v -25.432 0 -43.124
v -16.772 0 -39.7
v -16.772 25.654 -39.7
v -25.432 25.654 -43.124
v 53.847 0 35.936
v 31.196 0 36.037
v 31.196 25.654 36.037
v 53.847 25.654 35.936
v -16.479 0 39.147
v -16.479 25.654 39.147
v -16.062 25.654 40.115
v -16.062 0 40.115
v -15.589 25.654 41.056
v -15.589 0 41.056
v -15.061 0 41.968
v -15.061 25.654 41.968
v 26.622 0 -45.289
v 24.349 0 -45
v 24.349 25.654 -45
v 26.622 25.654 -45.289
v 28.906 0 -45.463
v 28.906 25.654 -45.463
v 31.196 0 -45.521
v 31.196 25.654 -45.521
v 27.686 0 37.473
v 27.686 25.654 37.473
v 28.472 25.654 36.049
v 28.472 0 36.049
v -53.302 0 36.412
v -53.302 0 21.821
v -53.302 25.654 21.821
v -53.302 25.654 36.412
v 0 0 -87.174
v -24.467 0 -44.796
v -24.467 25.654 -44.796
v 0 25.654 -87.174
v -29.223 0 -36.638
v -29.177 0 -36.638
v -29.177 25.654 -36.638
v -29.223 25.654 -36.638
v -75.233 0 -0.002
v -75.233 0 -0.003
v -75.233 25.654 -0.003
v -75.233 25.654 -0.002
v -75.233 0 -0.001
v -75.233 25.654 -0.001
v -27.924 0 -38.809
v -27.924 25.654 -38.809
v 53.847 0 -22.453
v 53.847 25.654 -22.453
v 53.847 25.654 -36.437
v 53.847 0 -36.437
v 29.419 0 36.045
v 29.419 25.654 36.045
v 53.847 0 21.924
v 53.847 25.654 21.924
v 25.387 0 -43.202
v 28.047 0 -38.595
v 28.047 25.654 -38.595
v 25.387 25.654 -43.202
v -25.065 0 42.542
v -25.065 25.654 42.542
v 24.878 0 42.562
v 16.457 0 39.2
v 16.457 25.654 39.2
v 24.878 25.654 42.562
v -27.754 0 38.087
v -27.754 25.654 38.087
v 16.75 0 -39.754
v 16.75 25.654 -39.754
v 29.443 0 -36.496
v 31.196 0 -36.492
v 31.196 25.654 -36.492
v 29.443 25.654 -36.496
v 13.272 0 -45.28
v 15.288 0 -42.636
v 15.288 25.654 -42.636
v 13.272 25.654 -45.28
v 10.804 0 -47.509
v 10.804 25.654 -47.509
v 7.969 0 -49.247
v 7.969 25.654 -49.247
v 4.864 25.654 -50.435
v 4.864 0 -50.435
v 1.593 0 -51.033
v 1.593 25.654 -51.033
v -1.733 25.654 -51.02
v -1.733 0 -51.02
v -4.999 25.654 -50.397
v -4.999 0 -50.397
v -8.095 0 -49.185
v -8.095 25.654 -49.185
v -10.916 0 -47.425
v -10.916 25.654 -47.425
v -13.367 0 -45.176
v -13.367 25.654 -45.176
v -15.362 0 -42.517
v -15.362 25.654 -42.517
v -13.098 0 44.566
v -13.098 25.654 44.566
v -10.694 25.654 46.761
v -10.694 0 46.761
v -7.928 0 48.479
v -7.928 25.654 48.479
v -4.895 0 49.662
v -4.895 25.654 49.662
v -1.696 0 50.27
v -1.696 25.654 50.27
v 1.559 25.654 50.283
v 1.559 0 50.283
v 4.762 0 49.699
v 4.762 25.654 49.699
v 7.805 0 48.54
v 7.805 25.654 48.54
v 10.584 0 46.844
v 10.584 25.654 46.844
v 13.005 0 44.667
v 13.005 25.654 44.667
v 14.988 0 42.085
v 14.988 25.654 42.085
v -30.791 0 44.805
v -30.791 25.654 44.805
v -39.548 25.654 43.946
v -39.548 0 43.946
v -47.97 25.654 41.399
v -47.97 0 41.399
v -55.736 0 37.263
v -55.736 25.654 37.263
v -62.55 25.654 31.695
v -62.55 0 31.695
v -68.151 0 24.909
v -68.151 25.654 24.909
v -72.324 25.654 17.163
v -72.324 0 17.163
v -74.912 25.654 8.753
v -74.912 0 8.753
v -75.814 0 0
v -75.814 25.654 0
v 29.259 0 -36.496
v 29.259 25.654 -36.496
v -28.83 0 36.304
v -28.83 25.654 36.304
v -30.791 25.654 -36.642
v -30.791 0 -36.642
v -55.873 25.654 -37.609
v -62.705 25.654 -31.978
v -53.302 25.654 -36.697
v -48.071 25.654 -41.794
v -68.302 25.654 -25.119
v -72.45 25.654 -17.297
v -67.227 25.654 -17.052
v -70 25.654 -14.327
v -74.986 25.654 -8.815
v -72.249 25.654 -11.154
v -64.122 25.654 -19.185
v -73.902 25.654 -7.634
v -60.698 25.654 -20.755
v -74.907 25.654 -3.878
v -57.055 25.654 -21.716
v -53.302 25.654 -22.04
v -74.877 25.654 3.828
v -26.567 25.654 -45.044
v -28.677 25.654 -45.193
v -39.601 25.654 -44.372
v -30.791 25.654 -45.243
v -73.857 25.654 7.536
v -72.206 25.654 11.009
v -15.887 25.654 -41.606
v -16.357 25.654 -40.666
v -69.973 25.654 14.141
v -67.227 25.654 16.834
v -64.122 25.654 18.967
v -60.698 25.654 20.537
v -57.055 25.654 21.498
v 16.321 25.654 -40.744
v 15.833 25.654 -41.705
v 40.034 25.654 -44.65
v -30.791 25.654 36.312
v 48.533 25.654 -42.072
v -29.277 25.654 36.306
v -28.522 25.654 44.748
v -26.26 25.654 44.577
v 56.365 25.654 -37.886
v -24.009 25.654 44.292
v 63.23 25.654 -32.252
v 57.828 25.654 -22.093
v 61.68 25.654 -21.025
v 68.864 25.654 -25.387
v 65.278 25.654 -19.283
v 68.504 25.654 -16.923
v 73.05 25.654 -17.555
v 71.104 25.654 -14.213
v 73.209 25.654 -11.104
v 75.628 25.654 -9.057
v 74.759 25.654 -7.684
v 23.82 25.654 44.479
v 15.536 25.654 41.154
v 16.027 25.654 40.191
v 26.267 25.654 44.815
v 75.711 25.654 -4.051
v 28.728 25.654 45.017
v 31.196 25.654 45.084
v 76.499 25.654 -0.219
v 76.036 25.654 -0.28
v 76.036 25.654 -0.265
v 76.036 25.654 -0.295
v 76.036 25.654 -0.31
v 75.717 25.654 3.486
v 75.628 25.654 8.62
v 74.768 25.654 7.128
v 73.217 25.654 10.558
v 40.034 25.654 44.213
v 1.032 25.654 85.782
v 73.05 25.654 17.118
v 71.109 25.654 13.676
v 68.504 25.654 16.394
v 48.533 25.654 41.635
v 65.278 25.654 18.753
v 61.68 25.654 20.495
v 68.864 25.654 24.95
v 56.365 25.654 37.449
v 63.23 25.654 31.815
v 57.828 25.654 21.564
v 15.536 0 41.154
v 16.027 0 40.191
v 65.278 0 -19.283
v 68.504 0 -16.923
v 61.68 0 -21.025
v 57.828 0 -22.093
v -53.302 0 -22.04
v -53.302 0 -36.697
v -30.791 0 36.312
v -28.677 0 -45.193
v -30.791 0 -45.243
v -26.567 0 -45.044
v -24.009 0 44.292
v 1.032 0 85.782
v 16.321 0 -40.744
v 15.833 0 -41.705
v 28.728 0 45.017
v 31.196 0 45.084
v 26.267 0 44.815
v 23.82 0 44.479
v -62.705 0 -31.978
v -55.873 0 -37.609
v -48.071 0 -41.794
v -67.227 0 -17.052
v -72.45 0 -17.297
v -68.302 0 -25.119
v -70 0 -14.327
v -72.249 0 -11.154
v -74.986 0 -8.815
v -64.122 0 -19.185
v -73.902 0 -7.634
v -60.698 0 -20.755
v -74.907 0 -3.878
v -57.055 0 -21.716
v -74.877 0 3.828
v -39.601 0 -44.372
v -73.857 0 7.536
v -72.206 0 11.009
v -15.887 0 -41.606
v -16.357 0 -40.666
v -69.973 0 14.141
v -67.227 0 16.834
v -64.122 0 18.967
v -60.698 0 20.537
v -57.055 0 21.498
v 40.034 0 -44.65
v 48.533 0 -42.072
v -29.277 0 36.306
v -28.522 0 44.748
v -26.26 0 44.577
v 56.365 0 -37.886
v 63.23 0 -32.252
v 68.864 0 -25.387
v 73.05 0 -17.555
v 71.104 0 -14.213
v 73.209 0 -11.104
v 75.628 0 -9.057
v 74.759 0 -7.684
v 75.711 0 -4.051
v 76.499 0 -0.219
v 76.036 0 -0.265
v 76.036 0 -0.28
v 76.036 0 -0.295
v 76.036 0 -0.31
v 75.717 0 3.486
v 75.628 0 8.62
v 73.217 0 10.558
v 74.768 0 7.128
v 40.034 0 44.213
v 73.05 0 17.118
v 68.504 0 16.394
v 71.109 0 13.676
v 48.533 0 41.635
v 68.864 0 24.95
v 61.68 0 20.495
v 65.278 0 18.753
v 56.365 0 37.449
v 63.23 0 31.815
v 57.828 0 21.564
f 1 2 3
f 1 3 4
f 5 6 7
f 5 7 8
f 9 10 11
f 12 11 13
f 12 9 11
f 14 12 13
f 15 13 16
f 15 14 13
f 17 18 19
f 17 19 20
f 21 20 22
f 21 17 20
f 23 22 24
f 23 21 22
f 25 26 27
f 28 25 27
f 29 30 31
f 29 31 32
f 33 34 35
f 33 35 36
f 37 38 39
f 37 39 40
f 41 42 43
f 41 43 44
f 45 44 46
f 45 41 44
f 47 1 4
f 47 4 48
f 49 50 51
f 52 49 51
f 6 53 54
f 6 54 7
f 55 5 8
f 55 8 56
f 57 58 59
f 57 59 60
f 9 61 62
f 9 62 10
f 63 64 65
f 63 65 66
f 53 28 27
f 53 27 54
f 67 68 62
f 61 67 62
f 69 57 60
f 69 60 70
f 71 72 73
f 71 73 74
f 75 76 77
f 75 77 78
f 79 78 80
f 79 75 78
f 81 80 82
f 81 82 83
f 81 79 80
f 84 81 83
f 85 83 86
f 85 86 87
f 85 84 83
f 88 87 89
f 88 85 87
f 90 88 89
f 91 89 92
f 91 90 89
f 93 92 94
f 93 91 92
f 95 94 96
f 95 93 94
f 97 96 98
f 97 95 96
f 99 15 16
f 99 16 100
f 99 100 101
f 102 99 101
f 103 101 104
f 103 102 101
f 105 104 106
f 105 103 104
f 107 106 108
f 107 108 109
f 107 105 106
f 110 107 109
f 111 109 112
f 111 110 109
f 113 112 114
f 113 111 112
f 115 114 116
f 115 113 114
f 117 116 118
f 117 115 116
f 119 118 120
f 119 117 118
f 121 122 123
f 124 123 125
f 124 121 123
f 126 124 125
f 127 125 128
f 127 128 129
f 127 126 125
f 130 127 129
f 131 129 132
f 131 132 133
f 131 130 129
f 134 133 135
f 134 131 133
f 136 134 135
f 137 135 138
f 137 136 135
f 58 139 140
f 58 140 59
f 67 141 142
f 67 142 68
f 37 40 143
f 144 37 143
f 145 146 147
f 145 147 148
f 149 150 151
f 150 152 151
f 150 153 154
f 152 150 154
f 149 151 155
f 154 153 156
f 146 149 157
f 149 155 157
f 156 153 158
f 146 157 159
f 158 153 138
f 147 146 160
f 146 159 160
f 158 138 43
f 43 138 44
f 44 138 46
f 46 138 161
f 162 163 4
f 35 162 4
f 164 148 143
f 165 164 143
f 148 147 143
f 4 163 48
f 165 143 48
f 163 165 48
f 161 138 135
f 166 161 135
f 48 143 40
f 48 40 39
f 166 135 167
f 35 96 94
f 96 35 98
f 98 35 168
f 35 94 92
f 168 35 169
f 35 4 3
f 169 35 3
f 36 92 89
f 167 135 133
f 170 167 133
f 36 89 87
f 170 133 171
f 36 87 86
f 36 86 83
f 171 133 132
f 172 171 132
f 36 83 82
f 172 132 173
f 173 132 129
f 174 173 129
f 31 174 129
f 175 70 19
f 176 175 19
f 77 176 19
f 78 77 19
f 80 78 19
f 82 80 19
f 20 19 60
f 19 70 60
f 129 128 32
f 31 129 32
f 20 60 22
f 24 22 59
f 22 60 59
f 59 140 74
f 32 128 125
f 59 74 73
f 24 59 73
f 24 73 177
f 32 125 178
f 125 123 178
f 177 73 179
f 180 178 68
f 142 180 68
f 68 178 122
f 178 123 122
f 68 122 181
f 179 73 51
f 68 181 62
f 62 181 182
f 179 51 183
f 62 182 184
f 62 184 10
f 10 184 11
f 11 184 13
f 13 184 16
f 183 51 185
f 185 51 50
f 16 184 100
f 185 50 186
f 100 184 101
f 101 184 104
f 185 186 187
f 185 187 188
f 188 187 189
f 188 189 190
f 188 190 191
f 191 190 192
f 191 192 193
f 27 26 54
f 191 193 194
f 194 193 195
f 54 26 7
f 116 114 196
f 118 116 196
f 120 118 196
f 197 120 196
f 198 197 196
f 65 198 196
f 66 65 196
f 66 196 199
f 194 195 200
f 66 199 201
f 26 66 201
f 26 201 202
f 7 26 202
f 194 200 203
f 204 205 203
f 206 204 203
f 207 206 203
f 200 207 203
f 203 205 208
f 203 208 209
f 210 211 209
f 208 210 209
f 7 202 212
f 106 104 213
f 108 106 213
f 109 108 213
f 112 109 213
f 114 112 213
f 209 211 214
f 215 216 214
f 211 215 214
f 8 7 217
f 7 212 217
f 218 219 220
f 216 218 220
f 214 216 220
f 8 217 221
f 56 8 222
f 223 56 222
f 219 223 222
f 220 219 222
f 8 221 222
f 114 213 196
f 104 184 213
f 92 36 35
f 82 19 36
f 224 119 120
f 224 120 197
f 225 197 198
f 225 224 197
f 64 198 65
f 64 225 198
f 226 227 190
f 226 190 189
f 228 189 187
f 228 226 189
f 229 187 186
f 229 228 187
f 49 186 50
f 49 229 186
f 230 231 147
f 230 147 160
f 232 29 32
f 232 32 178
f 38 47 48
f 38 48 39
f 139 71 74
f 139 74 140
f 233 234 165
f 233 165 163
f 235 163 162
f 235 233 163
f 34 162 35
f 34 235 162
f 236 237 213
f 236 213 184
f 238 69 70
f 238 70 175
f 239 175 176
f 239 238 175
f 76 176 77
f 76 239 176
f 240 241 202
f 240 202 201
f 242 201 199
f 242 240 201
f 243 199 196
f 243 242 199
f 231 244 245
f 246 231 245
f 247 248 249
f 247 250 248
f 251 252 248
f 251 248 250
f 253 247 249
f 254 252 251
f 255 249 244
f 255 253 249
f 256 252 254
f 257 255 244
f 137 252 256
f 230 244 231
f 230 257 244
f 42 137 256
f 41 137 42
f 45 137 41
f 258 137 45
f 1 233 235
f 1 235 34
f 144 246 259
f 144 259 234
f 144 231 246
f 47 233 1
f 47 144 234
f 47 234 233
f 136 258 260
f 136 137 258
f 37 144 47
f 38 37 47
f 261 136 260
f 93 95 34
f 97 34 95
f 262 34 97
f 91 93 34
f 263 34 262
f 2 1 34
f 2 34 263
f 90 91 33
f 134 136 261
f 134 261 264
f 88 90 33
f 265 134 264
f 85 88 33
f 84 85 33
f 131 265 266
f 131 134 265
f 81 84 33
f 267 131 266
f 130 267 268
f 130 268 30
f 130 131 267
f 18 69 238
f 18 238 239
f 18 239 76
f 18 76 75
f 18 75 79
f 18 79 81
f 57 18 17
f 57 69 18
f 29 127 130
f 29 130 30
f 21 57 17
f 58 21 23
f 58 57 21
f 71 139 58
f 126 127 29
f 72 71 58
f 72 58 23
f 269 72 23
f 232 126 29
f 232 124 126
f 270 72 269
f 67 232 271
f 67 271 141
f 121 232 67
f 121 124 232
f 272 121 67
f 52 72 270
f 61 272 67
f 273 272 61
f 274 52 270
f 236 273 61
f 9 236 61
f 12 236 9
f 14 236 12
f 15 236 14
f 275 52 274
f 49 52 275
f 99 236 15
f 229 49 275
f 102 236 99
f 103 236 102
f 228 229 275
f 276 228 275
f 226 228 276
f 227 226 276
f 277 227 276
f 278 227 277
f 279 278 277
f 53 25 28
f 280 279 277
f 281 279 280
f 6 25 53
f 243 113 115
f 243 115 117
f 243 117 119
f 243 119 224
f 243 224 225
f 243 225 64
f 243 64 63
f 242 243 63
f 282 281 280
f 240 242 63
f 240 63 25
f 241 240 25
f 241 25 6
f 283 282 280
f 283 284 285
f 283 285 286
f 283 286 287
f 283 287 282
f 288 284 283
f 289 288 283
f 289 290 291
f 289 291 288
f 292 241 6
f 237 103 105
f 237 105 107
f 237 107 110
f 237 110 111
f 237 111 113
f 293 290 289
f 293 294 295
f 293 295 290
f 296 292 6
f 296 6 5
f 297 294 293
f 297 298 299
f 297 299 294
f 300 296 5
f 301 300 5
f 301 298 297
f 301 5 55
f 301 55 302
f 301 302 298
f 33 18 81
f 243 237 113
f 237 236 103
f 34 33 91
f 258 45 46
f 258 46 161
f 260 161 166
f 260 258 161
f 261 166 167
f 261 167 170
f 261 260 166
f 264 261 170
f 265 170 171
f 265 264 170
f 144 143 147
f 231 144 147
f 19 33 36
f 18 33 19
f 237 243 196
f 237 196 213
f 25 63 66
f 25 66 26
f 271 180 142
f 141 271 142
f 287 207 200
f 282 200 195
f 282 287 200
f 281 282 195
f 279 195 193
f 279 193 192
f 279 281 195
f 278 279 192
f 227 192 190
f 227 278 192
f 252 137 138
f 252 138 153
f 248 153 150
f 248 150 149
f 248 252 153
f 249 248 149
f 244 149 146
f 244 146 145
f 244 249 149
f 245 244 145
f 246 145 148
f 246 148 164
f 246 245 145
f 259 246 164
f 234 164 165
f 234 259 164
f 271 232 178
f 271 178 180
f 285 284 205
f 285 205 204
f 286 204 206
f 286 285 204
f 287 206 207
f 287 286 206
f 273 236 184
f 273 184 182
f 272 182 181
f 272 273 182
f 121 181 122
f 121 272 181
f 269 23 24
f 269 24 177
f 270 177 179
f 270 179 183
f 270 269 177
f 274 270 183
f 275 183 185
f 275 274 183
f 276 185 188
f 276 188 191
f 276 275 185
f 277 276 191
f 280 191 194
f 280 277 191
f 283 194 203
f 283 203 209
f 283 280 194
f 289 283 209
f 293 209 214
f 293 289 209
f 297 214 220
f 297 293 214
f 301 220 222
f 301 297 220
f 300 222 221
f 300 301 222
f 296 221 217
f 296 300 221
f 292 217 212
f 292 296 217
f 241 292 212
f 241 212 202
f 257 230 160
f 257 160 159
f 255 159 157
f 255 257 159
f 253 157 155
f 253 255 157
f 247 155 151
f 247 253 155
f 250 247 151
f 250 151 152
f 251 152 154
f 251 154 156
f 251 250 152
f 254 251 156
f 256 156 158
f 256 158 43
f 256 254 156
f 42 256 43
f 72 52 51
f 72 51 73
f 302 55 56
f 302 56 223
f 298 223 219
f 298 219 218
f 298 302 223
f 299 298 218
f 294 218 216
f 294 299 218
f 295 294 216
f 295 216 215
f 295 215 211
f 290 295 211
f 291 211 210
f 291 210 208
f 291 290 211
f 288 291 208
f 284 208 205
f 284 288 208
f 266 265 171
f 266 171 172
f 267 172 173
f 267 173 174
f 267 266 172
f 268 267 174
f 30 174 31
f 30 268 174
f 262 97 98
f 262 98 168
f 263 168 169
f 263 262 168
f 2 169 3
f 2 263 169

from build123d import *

# Parameters (mm, degrees)
F1_DEPTH = 25.4
F2_DEPTH = 25.654


with BuildPart() as f1:
    # F0 (on Front) → F1 (new body)
    with BuildSketch(Plane.XZ):
        with BuildLine():
            ThreePointArc((-15.060614174, 41.9682624685), (-0.0688082783, 50.3511332937), (14.987647146, 42.0849420703))
            ThreePointArc((14.987647146, 42.0849420703), (19.3434405932, 43.5057594661), (23.8204686342, 44.4793500101))
            Line((23.8204686342, 44.4793500101), (1.0321482392, 85.7816260454))
            Line((1.0321482392, 85.7816260454), (-24.0085215463, 44.2917114126))
            ThreePointArc((-24.0085215463, 44.2917114126), (-19.4747765312, 43.3602512097), (-15.060614174, 41.9682624685))
        make_face()
    extrude(amount=-F1_DEPTH)

    # F0 (on Front) → F2 (join)
    with BuildSketch(Plane.XZ):
        with BuildLine():
            Line((-28.8295803882, 36.30369346), (-27.7535005612, 38.0866513657))
            Line((-27.7535005612, 38.0866513657), (-30.7906209519, 44.8054462665))
            ThreePointArc((-30.7906209519, 44.8054462665), (-29.6489661187, 40.624103652), (-29.2771657497, 36.3056819144))
            Line((-29.2771657497, 36.3056819144), (-28.8295803882, 36.30369346))
        make_face()
        Polygon((-30.7906209519, 44.8054462665), (-27.7535005612, 38.0866513657), (-25.0648295944, 42.54151339), align=None)
        with BuildLine():
            Line((-53.3023555948, 36.4124168488), (-30.7906209519, 36.3124056299))
            Line((-30.7906209519, 36.3124056299), (-30.7906209519, 44.8054462665))
            ThreePointArc((-30.7906209519, 44.8054462665), (-62.5500321621, 31.6953988364), (-75.8140902377, 0))
            Line((-75.8140902377, 0), (-75.2328084137, -0.0011871857))
            ThreePointArc((-75.2328084137, -0.0011871857), (-73.1076200485, 9.3092127471), (-67.2269157832, 16.8336588954))
            ThreePointArc((-67.2269157832, 16.8336588954), (-60.6978163865, 20.5368755433), (-53.3023555948, 21.8214424558))
            Line((-53.3023555948, 21.8214424558), (-53.3023555948, 36.4124168488))
        make_face()
        with BuildLine():
            Line((-30.7906209519, 44.8054462665), (-30.7906209519, 36.3124056299))
            Line((-30.7906209519, 36.3124056299), (-29.2771657497, 36.3056819144))
            ThreePointArc((-29.2771657497, 36.3056819144), (-29.6489661187, 40.624103652), (-30.7906209519, 44.8054462665))
        make_face()
        with BuildLine():
            Line((-25.0648295944, 42.54151339), (-16.4788366985, 39.1466793172))
            ThreePointArc((-16.4788366985, 39.1466793172), (-15.832705808, 40.5891269445), (-15.060614174, 41.9682624685))
            ThreePointArc((-15.060614174, 41.9682624685), (-19.4747765312, 43.3602512097), (-24.0085215463, 44.2917114126))
            Line((-24.0085215463, 44.2917114126), (-25.0648295944, 42.54151339))
        make_face()
        with BuildLine():
            ThreePointArc((23.8204686342, 44.4793500101), (19.3434405932, 43.5057594661), (14.987647146, 42.0849420703))
            ThreePointArc((14.987647146, 42.0849420703), (15.7885662341, 40.6763432088), (16.4574657961, 39.2004721052))
            Line((16.4574657961, 39.2004721052), (24.8784135948, 42.5618969449))
            Line((24.8784135948, 42.5618969449), (23.8204686342, 44.4793500101))
        make_face()
        with BuildLine():
            ThreePointArc((-15.060614174, 41.9682624685), (-0.0688082783, 50.3511332937), (14.987647146, 42.0849420703))
            ThreePointArc((14.987647146, 42.0849420703), (19.3434405932, 43.5057594661), (23.8204686342, 44.4793500101))
            Line((23.8204686342, 44.4793500101), (1.0321482392, 85.7816260454))
            Line((1.0321482392, 85.7816260454), (-24.0085215463, 44.2917114126))
            ThreePointArc((-24.0085215463, 44.2917114126), (-19.4747765312, 43.3602512097), (-15.060614174, 41.9682624685))
        make_face()
        with BuildLine():
            ThreePointArc((-24.0085215463, 44.2917114126), (-27.3898564846, 44.6768288461), (-30.7906209519, 44.8054462665))
            Line((-30.7906209519, 44.8054462665), (-25.0648295944, 42.54151339))
            Line((-25.0648295944, 42.54151339), (-24.0085215463, 44.2917114126))
        make_face()
        with BuildLine():
            Line((29.4191831059, 36.0449159855), (31.1962604648, 36.0370210954))
            Line((31.1962604648, 36.0370210954), (31.1962604648, 45.083818219))
            ThreePointArc((31.1962604648, 45.083818219), (29.8777965479, 40.6488917918), (29.4191831059, 36.0449159855))
        make_face()
        with BuildLine():
            Line((31.1962604648, 45.083818219), (31.1962604648, 36.0370210954))
            Line((31.1962604648, 36.0370210954), (53.8473990671, 35.9363905568))
            Line((53.8473990671, 35.9363905568), (53.8473990671, 21.9238056105))
            ThreePointArc((53.8473990671, 21.9238056105), (61.6802350926, 20.4952804957), (68.5044998261, 16.3936448398))
            ThreePointArc((68.5044998261, 16.3936448398), (74.0656549864, 8.8761377727), (76.0360198852, -0.2648152075))
            ThreePointArc((76.0360198852, -0.2648152075), (76.036008316, -0.2874737281), (76.0359736084, -0.310132225))
            Line((76.0359736084, -0.310132225), (76.4985376694, -0.3110769465))
            ThreePointArc((76.4985376694, -0.3110769465), (63.2625699929, 31.7823320468), (31.1962604648, 45.083818219))
        make_face()
        Polygon((24.8784135948, 42.5618969449), (27.686077002, 37.4731985658), (31.1962604648, 45.083818219), align=None)
        with BuildLine():
            Line((31.1962604648, 45.083818219), (27.686077002, 37.4731985658))
            Line((27.686077002, 37.4731985658), (28.4718024235, 36.0491248436))
            Line((28.4718024235, 36.0491248436), (29.4191831059, 36.0449159855))
            ThreePointArc((29.4191831059, 36.0449159855), (29.8777965479, 40.6488917918), (31.1962604648, 45.083818219))
        make_face()
        Polygon((-25.4324655009, -43.1239806736), (-27.9238592306, -38.808760152), (-30.7906209519, -45.2425532036), align=None)
        with BuildLine():
            Line((-30.7906209519, -45.2425532036), (-27.9238592306, -38.808760152))
            Line((-27.9238592306, -38.808760152), (-29.1769886883, -36.6382762629))
            Line((-29.1769886883, -36.6382762629), (-29.2232528573, -36.6383886578))
            ThreePointArc((-29.2232528573, -36.6383886578), (-29.6130237377, -41.012227686), (-30.7906209519, -45.2425532036))
        make_face()
        with BuildLine():
            ThreePointArc((31.1962604648, 45.083818219), (27.4960007799, 44.9324482787), (23.8204686342, 44.4793500101))
            Line((23.8204686342, 44.4793500101), (24.8784135948, 42.5618969449))
            Line((24.8784135948, 42.5618969449), (31.1962604648, 45.083818219))
        make_face()
        with BuildLine():
            Line((-75.2328164085, -0.0028216264), (-75.8140902377, 0))
            ThreePointArc((-75.8140902377, 0), (-62.704573257, -31.9779646787), (-30.7906209519, -45.2425532036))
            Line((-30.7906209519, -45.2425532036), (-30.7906209519, -36.6421964468))
            Line((-30.7906209519, -36.6421964468), (-53.3023555948, -36.6968868137))
            Line((-53.3023555948, -36.6968868137), (-53.3023555948, -22.0399959243))
            ThreePointArc((-53.3023555948, -22.0399959243), (-60.6978163865, -20.7554290119), (-67.2269157832, -17.052212364))
            ThreePointArc((-67.2269157832, -17.052212364), (-73.1534528918, -9.4307777023), (-75.2328164085, -0.0028216264))
        make_face()
        with BuildLine():
            Line((-75.2328084137, -0.0011871857), (-75.8140902377, 0))
            Line((-75.8140902377, 0), (-75.2328164085, -0.0028216264))
            ThreePointArc((-75.2328164085, -0.0028216264), (-75.2328124264, -0.002004406), (-75.2328084137, -0.0011871857))
        make_face()
        with BuildLine():
            Line((-25.4324655009, -43.1239806736), (-30.7906209519, -45.2425532036))
            ThreePointArc((-30.7906209519, -45.2425532036), (-27.6209328908, -45.1308416505), (-24.4669738087, -44.7962613387))
            Line((-24.4669738087, -44.7962613387), (-25.4324655009, -43.1239806736))
        make_face()
        with BuildLine():
            Line((-30.7906209519, -36.6421964468), (-30.7906209519, -45.2425532036))
            ThreePointArc((-30.7906209519, -45.2425532036), (-29.6130237377, -41.012227686), (-29.2232528573, -36.6383886578))
            Line((-29.2232528573, -36.6383886578), (-30.7906209519, -36.6421964468))
        make_face()
        with BuildLine():
            Line((-16.7719402399, -39.6996770897), (-25.4324655009, -43.1239806736))
            Line((-25.4324655009, -43.1239806736), (-24.4669738087, -44.7962613387))
            ThreePointArc((-24.4669738087, -44.7962613387), (-19.855090202, -43.8943444673), (-15.3623330745, -42.5166442684))
            ThreePointArc((-15.3623330745, -42.5166442684), (-16.1287540245, -41.1389939394), (-16.7719402399, -39.6996770897))
        make_face()
        with BuildLine():
            ThreePointArc((24.3490687404, -45.0004789074), (19.7574141393, -44.0529882803), (15.2882742932, -42.6360128042))
            ThreePointArc((15.2882742932, -42.6360128042), (-0.070238078, -51.1034201303), (-15.3623330745, -42.5166442684))
            ThreePointArc((-15.3623330745, -42.5166442684), (-19.855090202, -43.8943444673), (-24.4669738087, -44.7962613387))
            Line((-24.4669738087, -44.7962613387), (0, -87.1743030828))
            Line((0, -87.1743030828), (24.3490687404, -45.0004789074))
        make_face()
        with BuildLine():
            ThreePointArc((16.7501892204, -39.754426672), (16.0838947627, -41.2280252172), (15.2882742932, -42.6360128042))
            ThreePointArc((15.2882742932, -42.6360128042), (19.7574141393, -44.0529882803), (24.3490687404, -45.0004789074))
            Line((24.3490687404, -45.0004789074), (25.387333514, -43.2021515679))
            Line((25.387333514, -43.2021515679), (16.7501892204, -39.754426672))
        make_face()
        with BuildLine():
            Line((29.2589523384, -36.4963110564), (28.047162827, -38.5951920583))
            Line((28.047162827, -38.5951920583), (31.1962604648, -45.5209251562))
            ThreePointArc((31.1962604648, -45.5209251562), (29.8905818384, -41.0917228659), (29.4425640224, -36.4958649872))
            Line((29.4425640224, -36.4958649872), (29.2589523384, -36.4963110564))
        make_face()
        Polygon((31.1962604648, -45.5209251562), (28.047162827, -38.5951920583), (25.387333514, -43.2021515679), align=None)
        with BuildLine():
            ThreePointArc((68.5044998261, -16.9232752549), (61.6802350926, -21.0249109107), (53.8473990671, -22.4534360256))
            Line((53.8473990671, -22.4534360256), (53.8473990671, -36.436575492))
            Line((53.8473990671, -36.436575492), (31.1962604648, -36.4916045291))
            Line((31.1962604648, -36.4916045291), (31.1962604648, -45.5209251562))
            ThreePointArc((31.1962604648, -45.5209251562), (63.1971459801, -32.2848629967), (76.4985376694, -0.3110769465))
            Line((76.4985376694, -0.3110769465), (76.0359736084, -0.310132225))
            ThreePointArc((76.0359736084, -0.310132225), (74.056309909, -9.4264098499), (68.5044998261, -16.9232752549))
        make_face()
        with BuildLine():
            Line((25.387333514, -43.2021515679), (24.3490687404, -45.0004789074))
            ThreePointArc((24.3490687404, -45.0004789074), (27.7627892326, -45.3906262107), (31.1962604648, -45.5209251562))
            Line((31.1962604648, -45.5209251562), (25.387333514, -43.2021515679))
        make_face()
        with BuildLine():
            ThreePointArc((29.4425640224, -36.4958649872), (29.8905818384, -41.0917228659), (31.1962604648, -45.5209251562))
            Line((31.1962604648, -45.5209251562), (31.1962604648, -36.4916045291))
            Line((31.1962604648, -36.4916045291), (29.4425640224, -36.4958649872))
        make_face()
    extrude(amount=-F2_DEPTH)


solid = f1.part
